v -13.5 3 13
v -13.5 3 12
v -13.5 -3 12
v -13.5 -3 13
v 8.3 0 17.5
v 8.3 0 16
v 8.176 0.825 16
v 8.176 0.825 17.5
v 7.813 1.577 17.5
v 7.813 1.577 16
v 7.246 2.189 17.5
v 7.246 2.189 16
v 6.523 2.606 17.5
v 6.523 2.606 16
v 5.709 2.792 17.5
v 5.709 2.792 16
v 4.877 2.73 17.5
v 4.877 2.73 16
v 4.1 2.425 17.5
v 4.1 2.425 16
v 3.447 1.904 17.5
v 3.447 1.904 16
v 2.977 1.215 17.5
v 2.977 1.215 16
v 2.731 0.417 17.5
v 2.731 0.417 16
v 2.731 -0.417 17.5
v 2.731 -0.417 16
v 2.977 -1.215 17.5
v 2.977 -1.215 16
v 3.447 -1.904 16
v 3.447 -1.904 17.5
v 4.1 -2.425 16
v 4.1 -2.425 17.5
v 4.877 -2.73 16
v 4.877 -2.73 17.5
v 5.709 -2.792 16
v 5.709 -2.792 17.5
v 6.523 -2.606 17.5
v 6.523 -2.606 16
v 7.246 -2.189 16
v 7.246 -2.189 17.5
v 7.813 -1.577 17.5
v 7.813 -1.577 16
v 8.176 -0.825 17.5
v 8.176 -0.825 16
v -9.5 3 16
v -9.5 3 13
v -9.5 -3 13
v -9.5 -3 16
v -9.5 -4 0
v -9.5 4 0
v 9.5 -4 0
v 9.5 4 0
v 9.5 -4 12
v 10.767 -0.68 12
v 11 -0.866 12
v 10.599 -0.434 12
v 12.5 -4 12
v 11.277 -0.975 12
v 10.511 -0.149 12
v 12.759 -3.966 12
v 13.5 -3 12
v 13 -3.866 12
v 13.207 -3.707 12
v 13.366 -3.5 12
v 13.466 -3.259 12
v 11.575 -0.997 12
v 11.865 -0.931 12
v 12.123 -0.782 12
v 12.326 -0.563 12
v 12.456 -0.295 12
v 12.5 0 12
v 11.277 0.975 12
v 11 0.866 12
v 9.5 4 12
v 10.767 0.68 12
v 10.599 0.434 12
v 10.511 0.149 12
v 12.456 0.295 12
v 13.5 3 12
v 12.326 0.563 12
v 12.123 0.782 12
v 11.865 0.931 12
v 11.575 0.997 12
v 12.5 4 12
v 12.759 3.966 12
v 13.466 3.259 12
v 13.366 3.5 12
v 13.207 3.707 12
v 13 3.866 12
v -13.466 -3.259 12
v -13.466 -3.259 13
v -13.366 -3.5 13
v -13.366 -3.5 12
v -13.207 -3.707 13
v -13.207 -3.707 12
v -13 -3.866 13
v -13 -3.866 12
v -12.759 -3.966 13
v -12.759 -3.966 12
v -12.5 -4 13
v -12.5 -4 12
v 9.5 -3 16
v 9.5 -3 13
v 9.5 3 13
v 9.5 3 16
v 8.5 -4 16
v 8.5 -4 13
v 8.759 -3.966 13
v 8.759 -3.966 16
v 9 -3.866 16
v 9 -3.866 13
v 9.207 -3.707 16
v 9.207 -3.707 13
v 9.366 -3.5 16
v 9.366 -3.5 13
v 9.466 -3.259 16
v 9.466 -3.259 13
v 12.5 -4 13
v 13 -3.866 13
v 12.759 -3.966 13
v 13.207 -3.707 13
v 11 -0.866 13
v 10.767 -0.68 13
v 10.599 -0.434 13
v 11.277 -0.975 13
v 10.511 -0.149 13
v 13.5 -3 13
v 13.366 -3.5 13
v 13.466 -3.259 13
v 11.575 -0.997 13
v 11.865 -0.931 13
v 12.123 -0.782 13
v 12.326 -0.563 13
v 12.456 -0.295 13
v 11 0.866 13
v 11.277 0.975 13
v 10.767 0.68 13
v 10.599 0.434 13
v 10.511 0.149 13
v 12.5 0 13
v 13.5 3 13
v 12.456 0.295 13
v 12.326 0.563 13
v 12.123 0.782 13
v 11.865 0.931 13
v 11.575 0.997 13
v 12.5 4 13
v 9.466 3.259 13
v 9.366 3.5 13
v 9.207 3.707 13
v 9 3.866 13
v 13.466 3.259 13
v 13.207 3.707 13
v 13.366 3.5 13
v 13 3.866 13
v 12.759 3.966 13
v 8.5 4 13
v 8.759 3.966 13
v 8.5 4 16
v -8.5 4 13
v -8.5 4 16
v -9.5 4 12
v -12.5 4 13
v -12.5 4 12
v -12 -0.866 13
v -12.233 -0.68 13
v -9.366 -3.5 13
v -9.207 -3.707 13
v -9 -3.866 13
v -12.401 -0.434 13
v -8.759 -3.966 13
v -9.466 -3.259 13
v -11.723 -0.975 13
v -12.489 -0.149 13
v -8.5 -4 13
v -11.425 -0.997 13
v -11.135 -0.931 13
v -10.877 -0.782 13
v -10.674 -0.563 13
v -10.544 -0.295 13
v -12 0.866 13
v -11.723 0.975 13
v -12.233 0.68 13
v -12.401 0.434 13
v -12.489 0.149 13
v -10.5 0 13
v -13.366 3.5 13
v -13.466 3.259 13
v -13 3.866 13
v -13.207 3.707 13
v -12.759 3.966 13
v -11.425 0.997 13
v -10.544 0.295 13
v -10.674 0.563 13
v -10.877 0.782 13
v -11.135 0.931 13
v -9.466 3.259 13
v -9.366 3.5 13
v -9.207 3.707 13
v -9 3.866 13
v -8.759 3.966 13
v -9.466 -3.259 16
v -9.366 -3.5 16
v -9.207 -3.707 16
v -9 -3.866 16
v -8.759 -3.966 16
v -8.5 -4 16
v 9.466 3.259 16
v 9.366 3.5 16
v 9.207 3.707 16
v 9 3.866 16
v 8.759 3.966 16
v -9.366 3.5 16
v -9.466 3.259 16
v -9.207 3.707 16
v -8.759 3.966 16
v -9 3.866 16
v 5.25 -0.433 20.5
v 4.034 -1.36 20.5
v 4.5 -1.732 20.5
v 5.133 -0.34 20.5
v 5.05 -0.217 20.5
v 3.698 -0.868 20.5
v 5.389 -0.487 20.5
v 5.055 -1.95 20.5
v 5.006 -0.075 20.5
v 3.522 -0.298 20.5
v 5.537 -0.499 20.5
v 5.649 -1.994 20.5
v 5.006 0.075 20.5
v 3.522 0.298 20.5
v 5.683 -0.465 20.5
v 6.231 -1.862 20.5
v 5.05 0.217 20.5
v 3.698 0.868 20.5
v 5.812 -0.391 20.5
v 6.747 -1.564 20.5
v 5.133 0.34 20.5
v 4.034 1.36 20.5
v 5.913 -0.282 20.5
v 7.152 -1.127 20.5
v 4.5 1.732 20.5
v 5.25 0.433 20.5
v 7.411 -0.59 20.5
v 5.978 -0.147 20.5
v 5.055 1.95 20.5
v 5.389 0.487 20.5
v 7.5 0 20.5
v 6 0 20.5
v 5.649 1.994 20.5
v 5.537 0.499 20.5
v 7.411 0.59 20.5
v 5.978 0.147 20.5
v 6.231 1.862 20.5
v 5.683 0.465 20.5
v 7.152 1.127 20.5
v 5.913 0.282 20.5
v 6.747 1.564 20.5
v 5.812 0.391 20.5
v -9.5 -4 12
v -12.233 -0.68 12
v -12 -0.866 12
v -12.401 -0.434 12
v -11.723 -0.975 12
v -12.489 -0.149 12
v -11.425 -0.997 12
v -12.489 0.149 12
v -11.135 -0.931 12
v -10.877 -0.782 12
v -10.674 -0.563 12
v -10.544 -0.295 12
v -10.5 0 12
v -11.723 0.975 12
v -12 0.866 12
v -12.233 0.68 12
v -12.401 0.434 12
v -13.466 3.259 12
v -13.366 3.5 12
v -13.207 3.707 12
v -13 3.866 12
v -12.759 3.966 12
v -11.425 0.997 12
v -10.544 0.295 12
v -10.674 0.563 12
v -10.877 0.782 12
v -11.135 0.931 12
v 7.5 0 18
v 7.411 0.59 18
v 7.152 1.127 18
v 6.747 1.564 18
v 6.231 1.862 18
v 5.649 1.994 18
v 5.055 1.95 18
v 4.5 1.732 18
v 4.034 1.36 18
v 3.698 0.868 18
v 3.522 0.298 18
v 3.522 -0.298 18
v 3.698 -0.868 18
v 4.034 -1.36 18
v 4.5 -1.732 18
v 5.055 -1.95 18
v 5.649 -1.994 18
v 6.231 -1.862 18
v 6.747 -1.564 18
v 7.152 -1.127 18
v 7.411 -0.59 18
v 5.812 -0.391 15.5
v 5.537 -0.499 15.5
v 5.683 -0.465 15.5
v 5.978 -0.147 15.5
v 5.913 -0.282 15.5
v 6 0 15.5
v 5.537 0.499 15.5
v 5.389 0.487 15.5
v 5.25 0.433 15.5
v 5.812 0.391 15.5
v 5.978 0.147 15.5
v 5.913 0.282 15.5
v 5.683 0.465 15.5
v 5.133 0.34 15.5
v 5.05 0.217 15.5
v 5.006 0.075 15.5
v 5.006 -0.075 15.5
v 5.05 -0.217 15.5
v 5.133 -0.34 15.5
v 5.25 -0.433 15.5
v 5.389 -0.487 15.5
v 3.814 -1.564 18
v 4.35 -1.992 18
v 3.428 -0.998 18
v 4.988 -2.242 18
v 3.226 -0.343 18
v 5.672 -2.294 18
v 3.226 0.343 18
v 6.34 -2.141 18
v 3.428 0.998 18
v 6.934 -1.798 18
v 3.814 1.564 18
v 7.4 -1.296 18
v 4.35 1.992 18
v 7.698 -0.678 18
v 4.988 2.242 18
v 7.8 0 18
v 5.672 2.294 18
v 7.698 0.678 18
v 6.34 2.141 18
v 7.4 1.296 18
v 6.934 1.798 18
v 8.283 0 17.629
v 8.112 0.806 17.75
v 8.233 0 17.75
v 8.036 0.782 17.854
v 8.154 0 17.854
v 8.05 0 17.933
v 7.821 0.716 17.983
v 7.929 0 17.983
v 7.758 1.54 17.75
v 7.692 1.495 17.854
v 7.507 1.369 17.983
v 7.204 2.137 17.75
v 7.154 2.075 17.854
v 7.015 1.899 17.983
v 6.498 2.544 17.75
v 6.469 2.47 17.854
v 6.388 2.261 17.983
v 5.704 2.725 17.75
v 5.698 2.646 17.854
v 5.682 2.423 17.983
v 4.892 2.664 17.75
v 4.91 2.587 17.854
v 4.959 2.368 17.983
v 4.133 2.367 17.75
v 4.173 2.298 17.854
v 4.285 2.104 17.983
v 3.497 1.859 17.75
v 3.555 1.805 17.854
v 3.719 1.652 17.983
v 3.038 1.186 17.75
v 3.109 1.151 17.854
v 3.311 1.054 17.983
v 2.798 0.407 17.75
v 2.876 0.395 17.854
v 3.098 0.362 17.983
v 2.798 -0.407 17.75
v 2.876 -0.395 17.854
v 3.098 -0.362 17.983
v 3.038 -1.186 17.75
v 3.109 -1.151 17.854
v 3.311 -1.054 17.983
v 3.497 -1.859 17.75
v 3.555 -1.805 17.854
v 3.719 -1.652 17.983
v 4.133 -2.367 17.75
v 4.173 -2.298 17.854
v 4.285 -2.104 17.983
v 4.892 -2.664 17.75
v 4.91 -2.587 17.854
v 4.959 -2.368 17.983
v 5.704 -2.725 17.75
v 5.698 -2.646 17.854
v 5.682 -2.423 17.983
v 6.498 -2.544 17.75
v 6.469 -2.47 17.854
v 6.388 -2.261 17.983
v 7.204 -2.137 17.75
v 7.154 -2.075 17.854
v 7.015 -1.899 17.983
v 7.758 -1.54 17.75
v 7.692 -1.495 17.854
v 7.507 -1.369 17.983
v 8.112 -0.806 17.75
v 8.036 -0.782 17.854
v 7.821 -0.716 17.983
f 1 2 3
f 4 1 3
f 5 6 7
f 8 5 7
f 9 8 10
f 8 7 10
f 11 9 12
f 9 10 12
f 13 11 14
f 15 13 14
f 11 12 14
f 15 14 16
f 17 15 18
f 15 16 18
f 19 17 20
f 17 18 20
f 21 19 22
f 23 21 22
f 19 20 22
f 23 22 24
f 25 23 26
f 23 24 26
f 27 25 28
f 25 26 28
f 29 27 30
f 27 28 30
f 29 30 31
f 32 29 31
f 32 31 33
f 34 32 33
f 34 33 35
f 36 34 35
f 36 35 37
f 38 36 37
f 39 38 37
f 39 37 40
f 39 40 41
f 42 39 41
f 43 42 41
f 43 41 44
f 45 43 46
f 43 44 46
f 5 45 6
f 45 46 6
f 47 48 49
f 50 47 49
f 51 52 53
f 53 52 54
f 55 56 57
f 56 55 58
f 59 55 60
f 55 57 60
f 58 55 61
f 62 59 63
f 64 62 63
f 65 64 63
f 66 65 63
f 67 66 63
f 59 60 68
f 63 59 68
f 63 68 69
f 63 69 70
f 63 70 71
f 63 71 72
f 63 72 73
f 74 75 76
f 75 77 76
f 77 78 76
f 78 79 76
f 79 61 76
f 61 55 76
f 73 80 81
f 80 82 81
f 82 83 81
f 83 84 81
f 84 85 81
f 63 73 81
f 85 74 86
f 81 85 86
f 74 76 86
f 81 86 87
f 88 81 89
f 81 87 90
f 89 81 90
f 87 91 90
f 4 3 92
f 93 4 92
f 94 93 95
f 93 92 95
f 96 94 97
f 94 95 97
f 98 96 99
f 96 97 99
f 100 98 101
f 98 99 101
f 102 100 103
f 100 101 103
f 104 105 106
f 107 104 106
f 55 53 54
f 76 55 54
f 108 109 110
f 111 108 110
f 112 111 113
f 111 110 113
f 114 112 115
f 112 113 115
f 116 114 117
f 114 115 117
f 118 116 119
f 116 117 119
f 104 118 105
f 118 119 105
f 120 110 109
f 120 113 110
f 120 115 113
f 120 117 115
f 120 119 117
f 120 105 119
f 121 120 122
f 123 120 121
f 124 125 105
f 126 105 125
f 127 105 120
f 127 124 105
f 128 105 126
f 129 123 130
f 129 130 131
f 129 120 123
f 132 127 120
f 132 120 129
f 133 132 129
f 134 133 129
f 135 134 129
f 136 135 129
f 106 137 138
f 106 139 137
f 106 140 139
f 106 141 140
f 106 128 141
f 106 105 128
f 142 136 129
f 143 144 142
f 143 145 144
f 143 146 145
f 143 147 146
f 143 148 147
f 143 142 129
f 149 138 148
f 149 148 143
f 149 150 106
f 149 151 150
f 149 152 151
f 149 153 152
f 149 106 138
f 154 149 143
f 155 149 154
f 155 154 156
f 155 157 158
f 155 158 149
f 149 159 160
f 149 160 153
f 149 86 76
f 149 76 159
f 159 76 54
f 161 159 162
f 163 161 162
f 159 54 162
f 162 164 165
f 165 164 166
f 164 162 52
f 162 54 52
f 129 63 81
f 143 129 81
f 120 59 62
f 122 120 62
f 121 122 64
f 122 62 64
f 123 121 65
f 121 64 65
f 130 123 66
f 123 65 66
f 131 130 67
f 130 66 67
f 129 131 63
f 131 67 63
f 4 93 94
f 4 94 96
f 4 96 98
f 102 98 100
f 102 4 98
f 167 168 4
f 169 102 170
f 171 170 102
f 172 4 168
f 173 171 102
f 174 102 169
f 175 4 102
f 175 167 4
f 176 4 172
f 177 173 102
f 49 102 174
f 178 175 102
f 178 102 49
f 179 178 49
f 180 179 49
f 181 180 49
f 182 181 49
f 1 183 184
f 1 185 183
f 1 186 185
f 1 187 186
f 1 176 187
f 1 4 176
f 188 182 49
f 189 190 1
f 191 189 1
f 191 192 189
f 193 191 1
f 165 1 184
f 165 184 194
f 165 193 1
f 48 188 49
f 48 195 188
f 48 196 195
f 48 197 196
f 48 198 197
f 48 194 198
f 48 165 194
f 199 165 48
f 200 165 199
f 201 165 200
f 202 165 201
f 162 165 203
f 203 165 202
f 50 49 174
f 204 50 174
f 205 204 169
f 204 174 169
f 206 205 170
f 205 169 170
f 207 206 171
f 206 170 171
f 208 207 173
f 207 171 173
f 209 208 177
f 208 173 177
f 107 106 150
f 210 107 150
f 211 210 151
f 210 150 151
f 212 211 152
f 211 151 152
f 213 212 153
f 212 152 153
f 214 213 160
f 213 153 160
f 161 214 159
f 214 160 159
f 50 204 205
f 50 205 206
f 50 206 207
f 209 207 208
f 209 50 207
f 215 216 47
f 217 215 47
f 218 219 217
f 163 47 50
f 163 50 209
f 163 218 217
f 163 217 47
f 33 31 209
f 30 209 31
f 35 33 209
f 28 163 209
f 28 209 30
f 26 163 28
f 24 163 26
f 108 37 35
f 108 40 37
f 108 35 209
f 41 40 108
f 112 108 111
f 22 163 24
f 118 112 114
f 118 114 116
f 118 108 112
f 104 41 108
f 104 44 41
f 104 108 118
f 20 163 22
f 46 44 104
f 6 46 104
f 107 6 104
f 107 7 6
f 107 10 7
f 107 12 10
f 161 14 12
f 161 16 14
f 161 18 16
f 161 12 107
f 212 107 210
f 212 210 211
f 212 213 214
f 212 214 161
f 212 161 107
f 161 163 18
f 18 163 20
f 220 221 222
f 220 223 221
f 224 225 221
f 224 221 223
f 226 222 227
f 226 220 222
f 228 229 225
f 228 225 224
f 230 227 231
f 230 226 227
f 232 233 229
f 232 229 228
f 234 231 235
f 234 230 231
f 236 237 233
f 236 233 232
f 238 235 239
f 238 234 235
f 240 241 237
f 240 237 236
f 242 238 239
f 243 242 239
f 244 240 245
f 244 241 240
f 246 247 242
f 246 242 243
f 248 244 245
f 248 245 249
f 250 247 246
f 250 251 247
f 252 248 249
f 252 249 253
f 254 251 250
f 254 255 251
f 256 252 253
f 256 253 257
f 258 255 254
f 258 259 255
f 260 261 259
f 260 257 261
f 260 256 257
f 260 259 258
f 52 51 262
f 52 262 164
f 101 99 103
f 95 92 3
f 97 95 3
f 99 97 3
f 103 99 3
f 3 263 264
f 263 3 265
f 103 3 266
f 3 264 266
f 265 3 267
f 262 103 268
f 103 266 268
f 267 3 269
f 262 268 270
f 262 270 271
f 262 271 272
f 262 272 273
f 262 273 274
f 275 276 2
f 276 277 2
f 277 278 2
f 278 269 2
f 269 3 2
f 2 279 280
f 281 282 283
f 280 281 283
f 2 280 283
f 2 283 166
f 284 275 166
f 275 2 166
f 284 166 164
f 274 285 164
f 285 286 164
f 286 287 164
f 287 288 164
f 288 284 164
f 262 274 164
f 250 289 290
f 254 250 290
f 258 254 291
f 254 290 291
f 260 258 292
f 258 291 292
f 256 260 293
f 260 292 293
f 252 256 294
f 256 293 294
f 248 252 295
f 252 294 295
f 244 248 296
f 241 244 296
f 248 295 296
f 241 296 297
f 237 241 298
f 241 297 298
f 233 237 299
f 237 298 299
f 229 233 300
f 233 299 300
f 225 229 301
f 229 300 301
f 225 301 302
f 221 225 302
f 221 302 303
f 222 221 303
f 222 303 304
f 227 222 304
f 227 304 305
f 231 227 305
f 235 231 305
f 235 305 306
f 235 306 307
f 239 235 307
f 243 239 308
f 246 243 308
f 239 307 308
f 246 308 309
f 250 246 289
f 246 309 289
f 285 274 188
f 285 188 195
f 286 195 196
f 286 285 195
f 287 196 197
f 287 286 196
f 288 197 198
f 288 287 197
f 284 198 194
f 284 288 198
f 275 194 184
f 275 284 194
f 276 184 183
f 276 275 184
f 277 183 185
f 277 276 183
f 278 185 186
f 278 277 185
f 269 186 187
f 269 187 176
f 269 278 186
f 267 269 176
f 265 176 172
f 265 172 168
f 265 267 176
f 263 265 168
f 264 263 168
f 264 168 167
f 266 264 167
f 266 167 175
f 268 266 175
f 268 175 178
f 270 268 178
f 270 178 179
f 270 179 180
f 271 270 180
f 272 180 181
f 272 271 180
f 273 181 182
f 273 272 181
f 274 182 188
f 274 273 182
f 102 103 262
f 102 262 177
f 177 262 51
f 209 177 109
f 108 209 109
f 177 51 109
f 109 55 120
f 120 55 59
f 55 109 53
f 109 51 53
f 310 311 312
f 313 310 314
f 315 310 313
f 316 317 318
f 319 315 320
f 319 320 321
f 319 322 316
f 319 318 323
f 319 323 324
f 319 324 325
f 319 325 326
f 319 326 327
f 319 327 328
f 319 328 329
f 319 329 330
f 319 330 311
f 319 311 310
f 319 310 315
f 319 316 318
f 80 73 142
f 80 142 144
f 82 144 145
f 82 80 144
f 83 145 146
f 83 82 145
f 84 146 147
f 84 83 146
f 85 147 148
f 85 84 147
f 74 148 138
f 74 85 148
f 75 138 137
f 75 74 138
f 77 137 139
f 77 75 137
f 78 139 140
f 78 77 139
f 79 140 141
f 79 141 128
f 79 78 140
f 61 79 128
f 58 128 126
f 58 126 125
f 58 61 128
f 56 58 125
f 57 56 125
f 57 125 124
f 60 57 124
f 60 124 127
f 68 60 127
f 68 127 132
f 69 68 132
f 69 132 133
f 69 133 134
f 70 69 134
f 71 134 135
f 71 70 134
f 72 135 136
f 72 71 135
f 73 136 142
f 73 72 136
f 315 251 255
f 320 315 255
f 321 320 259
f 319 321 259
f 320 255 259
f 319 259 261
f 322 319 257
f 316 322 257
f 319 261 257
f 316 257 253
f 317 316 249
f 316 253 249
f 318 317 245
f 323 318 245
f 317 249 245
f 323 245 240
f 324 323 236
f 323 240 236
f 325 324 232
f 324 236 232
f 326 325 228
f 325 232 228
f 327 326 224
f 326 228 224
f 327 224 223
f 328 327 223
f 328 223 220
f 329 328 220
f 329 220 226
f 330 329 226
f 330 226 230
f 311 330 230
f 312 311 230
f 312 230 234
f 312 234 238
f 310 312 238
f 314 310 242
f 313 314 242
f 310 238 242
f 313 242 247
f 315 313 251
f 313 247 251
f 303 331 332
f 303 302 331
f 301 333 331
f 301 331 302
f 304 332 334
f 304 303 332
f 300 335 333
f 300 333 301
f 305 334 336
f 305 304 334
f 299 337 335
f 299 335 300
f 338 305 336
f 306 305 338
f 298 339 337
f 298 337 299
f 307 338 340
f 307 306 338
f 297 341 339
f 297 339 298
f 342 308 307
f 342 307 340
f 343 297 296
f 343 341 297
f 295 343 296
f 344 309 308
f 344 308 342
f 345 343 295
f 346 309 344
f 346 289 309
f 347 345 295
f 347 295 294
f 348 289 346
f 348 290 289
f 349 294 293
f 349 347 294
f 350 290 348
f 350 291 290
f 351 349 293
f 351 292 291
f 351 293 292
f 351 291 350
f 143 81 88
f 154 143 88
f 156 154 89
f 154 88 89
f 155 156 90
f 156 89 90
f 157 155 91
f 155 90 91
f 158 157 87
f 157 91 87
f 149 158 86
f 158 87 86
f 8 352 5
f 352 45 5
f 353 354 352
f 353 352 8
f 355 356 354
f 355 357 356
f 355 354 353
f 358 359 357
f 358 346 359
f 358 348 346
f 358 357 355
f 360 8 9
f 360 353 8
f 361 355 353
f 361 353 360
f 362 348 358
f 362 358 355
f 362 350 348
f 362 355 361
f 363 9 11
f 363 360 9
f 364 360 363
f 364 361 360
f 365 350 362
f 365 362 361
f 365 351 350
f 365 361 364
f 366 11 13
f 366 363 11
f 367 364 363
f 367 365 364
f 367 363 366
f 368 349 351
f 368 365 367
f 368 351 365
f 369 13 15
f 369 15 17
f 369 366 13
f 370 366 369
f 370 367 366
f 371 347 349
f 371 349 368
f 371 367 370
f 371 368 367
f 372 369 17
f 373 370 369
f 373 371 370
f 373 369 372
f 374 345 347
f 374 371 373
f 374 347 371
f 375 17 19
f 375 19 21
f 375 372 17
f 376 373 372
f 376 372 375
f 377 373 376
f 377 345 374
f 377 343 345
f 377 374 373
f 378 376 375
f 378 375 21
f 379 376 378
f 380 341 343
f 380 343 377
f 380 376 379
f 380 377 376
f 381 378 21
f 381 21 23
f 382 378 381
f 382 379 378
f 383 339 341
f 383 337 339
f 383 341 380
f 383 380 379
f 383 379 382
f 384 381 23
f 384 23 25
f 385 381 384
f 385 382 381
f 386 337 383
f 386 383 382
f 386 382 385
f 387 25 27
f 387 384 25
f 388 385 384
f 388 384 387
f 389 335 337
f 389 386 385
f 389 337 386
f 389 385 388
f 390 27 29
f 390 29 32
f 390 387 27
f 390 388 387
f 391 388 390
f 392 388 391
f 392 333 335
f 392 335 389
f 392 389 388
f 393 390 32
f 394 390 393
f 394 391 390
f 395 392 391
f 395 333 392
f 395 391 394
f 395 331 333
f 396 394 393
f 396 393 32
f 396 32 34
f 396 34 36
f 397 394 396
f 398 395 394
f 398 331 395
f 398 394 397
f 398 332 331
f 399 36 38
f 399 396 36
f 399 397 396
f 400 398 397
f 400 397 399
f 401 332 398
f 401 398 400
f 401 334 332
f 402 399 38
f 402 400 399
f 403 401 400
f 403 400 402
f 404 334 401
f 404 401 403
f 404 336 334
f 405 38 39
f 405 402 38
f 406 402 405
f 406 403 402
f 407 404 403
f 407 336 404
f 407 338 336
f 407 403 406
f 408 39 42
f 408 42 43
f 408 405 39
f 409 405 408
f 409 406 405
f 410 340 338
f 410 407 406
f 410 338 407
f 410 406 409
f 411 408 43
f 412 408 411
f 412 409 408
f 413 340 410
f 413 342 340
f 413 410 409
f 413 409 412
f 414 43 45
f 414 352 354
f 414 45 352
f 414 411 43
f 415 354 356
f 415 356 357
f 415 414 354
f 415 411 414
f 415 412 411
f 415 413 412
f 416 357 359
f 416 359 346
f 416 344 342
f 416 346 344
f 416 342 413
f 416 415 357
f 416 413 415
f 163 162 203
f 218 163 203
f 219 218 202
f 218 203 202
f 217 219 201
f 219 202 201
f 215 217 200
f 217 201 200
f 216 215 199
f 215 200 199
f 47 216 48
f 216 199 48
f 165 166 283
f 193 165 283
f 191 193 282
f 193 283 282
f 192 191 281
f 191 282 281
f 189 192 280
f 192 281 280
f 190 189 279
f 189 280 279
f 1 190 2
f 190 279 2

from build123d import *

# Parameters (mm, degrees)
IZIM1_W                     = 19
IZIM1_H                     = 8
Y_KSEKLIK_EKSTR_ZYON1_DEPTH = 12
IZIM2_R                     = 1
Y_KSEKLIK_EKSTR_ZYON2_DEPTH = 1
Y_KSEKLIK_EKSTR_ZYON3_DEPTH = 3
IZIM4_R                     = 2.8
Y_KSEKLIK_EKSTR_ZYON4_DEPTH = 2
IZIM5_R                     = 2
Y_KSEKLIK_EKSTR_ZYON5_DEPTH = 2.5
IZIM6_R                     = 0.5
KES_EKSTR_ZYON1_DEPTH       = 5
RADYUS1_R                   = 0.5


with BuildPart() as part:
    # Çizim1 → Yükseklik-Ekstrüzyon1 (new body)
    with BuildSketch(Plane.XY):
        Rectangle(IZIM1_W, IZIM1_H)
    extrude(amount=Y_KSEKLIK_EKSTR_ZYON1_DEPTH)

    # Çizim2 → Yükseklik-Ekstrüzyon2 (add)
    with BuildSketch(Plane.XY.offset(12)):
        with BuildLine():
            Line((-12.5, -4), (12.5, -4))
            ThreePointArc((12.5, -4), (13.207106781, -3.707106781), (13.5, -3))
            Line((13.5, -3), (13.5, 3))
            ThreePointArc((13.5, 3), (13.207106781, 3.707106781), (12.5, 4))
            Line((12.5, 4), (-12.5, 4))
            ThreePointArc((-12.5, 4), (-13.207106781, 3.707106781), (-13.5, 3))
            Line((-13.5, 3), (-13.5, -3))
            ThreePointArc((-13.5, -3), (-13.207106781, -3.707106781), (-12.5, -4))
        make_face()
        with Locations((-11.5, 0)):
            Circle(IZIM2_R, mode=Mode.SUBTRACT)
        with Locations((11.5, 0)):
            Circle(IZIM2_R, mode=Mode.SUBTRACT)
    extrude(amount=Y_KSEKLIK_EKSTR_ZYON2_DEPTH)

    # Çizim3 → Yükseklik-Ekstrüzyon3 (add)
    with BuildSketch(Plane.XY.offset(13)):
        with BuildLine():
            Line((-8.5, -4), (8.5, -4))
            ThreePointArc((8.5, -4), (9.207106781, -3.707106781), (9.5, -3))
            Line((9.5, -3), (9.5, 3))
            ThreePointArc((9.5, 3), (9.207106781, 3.707106781), (8.5, 4))
            Line((8.5, 4), (-8.5, 4))
            ThreePointArc((-8.5, 4), (-9.207106781, 3.707106781), (-9.5, 3))
            Line((-9.5, 3), (-9.5, -3))
            ThreePointArc((-9.5, -3), (-9.207106781, -3.707106781), (-8.5, -4))
        make_face()
    extrude(amount=Y_KSEKLIK_EKSTR_ZYON3_DEPTH)

    # Çizim4 → Yükseklik-Ekstrüzyon4 (add)
    with BuildSketch(Plane.XY.offset(16)):
        with Locations((5.5, 0)):
            Circle(IZIM4_R)
    extrude(amount=Y_KSEKLIK_EKSTR_ZYON4_DEPTH)

    # Çizim5 → Yükseklik-Ekstrüzyon5 (add)
    with BuildSketch(Plane.XY.offset(18)):
        with Locations((5.5, 0)):
            Circle(IZIM5_R)
    extrude(amount=Y_KSEKLIK_EKSTR_ZYON5_DEPTH)

    # Çizim6 → Kes-Ekstrüzyon1 (cut)
    with BuildSketch(Plane.XY.offset(20.5)):
        with Locations((5.5, 0)):
            Circle(IZIM6_R)
    extrude(amount=-KES_EKSTR_ZYON1_DEPTH, mode=Mode.SUBTRACT)

    # Radyus1
    radyus1_edges = [part.edges().sort_by_distance(p)[0] for p in [
        (2.7, 0, 18),
    ]]
    fillet(radyus1_edges, radius=RADYUS1_R)


solid = part.part
